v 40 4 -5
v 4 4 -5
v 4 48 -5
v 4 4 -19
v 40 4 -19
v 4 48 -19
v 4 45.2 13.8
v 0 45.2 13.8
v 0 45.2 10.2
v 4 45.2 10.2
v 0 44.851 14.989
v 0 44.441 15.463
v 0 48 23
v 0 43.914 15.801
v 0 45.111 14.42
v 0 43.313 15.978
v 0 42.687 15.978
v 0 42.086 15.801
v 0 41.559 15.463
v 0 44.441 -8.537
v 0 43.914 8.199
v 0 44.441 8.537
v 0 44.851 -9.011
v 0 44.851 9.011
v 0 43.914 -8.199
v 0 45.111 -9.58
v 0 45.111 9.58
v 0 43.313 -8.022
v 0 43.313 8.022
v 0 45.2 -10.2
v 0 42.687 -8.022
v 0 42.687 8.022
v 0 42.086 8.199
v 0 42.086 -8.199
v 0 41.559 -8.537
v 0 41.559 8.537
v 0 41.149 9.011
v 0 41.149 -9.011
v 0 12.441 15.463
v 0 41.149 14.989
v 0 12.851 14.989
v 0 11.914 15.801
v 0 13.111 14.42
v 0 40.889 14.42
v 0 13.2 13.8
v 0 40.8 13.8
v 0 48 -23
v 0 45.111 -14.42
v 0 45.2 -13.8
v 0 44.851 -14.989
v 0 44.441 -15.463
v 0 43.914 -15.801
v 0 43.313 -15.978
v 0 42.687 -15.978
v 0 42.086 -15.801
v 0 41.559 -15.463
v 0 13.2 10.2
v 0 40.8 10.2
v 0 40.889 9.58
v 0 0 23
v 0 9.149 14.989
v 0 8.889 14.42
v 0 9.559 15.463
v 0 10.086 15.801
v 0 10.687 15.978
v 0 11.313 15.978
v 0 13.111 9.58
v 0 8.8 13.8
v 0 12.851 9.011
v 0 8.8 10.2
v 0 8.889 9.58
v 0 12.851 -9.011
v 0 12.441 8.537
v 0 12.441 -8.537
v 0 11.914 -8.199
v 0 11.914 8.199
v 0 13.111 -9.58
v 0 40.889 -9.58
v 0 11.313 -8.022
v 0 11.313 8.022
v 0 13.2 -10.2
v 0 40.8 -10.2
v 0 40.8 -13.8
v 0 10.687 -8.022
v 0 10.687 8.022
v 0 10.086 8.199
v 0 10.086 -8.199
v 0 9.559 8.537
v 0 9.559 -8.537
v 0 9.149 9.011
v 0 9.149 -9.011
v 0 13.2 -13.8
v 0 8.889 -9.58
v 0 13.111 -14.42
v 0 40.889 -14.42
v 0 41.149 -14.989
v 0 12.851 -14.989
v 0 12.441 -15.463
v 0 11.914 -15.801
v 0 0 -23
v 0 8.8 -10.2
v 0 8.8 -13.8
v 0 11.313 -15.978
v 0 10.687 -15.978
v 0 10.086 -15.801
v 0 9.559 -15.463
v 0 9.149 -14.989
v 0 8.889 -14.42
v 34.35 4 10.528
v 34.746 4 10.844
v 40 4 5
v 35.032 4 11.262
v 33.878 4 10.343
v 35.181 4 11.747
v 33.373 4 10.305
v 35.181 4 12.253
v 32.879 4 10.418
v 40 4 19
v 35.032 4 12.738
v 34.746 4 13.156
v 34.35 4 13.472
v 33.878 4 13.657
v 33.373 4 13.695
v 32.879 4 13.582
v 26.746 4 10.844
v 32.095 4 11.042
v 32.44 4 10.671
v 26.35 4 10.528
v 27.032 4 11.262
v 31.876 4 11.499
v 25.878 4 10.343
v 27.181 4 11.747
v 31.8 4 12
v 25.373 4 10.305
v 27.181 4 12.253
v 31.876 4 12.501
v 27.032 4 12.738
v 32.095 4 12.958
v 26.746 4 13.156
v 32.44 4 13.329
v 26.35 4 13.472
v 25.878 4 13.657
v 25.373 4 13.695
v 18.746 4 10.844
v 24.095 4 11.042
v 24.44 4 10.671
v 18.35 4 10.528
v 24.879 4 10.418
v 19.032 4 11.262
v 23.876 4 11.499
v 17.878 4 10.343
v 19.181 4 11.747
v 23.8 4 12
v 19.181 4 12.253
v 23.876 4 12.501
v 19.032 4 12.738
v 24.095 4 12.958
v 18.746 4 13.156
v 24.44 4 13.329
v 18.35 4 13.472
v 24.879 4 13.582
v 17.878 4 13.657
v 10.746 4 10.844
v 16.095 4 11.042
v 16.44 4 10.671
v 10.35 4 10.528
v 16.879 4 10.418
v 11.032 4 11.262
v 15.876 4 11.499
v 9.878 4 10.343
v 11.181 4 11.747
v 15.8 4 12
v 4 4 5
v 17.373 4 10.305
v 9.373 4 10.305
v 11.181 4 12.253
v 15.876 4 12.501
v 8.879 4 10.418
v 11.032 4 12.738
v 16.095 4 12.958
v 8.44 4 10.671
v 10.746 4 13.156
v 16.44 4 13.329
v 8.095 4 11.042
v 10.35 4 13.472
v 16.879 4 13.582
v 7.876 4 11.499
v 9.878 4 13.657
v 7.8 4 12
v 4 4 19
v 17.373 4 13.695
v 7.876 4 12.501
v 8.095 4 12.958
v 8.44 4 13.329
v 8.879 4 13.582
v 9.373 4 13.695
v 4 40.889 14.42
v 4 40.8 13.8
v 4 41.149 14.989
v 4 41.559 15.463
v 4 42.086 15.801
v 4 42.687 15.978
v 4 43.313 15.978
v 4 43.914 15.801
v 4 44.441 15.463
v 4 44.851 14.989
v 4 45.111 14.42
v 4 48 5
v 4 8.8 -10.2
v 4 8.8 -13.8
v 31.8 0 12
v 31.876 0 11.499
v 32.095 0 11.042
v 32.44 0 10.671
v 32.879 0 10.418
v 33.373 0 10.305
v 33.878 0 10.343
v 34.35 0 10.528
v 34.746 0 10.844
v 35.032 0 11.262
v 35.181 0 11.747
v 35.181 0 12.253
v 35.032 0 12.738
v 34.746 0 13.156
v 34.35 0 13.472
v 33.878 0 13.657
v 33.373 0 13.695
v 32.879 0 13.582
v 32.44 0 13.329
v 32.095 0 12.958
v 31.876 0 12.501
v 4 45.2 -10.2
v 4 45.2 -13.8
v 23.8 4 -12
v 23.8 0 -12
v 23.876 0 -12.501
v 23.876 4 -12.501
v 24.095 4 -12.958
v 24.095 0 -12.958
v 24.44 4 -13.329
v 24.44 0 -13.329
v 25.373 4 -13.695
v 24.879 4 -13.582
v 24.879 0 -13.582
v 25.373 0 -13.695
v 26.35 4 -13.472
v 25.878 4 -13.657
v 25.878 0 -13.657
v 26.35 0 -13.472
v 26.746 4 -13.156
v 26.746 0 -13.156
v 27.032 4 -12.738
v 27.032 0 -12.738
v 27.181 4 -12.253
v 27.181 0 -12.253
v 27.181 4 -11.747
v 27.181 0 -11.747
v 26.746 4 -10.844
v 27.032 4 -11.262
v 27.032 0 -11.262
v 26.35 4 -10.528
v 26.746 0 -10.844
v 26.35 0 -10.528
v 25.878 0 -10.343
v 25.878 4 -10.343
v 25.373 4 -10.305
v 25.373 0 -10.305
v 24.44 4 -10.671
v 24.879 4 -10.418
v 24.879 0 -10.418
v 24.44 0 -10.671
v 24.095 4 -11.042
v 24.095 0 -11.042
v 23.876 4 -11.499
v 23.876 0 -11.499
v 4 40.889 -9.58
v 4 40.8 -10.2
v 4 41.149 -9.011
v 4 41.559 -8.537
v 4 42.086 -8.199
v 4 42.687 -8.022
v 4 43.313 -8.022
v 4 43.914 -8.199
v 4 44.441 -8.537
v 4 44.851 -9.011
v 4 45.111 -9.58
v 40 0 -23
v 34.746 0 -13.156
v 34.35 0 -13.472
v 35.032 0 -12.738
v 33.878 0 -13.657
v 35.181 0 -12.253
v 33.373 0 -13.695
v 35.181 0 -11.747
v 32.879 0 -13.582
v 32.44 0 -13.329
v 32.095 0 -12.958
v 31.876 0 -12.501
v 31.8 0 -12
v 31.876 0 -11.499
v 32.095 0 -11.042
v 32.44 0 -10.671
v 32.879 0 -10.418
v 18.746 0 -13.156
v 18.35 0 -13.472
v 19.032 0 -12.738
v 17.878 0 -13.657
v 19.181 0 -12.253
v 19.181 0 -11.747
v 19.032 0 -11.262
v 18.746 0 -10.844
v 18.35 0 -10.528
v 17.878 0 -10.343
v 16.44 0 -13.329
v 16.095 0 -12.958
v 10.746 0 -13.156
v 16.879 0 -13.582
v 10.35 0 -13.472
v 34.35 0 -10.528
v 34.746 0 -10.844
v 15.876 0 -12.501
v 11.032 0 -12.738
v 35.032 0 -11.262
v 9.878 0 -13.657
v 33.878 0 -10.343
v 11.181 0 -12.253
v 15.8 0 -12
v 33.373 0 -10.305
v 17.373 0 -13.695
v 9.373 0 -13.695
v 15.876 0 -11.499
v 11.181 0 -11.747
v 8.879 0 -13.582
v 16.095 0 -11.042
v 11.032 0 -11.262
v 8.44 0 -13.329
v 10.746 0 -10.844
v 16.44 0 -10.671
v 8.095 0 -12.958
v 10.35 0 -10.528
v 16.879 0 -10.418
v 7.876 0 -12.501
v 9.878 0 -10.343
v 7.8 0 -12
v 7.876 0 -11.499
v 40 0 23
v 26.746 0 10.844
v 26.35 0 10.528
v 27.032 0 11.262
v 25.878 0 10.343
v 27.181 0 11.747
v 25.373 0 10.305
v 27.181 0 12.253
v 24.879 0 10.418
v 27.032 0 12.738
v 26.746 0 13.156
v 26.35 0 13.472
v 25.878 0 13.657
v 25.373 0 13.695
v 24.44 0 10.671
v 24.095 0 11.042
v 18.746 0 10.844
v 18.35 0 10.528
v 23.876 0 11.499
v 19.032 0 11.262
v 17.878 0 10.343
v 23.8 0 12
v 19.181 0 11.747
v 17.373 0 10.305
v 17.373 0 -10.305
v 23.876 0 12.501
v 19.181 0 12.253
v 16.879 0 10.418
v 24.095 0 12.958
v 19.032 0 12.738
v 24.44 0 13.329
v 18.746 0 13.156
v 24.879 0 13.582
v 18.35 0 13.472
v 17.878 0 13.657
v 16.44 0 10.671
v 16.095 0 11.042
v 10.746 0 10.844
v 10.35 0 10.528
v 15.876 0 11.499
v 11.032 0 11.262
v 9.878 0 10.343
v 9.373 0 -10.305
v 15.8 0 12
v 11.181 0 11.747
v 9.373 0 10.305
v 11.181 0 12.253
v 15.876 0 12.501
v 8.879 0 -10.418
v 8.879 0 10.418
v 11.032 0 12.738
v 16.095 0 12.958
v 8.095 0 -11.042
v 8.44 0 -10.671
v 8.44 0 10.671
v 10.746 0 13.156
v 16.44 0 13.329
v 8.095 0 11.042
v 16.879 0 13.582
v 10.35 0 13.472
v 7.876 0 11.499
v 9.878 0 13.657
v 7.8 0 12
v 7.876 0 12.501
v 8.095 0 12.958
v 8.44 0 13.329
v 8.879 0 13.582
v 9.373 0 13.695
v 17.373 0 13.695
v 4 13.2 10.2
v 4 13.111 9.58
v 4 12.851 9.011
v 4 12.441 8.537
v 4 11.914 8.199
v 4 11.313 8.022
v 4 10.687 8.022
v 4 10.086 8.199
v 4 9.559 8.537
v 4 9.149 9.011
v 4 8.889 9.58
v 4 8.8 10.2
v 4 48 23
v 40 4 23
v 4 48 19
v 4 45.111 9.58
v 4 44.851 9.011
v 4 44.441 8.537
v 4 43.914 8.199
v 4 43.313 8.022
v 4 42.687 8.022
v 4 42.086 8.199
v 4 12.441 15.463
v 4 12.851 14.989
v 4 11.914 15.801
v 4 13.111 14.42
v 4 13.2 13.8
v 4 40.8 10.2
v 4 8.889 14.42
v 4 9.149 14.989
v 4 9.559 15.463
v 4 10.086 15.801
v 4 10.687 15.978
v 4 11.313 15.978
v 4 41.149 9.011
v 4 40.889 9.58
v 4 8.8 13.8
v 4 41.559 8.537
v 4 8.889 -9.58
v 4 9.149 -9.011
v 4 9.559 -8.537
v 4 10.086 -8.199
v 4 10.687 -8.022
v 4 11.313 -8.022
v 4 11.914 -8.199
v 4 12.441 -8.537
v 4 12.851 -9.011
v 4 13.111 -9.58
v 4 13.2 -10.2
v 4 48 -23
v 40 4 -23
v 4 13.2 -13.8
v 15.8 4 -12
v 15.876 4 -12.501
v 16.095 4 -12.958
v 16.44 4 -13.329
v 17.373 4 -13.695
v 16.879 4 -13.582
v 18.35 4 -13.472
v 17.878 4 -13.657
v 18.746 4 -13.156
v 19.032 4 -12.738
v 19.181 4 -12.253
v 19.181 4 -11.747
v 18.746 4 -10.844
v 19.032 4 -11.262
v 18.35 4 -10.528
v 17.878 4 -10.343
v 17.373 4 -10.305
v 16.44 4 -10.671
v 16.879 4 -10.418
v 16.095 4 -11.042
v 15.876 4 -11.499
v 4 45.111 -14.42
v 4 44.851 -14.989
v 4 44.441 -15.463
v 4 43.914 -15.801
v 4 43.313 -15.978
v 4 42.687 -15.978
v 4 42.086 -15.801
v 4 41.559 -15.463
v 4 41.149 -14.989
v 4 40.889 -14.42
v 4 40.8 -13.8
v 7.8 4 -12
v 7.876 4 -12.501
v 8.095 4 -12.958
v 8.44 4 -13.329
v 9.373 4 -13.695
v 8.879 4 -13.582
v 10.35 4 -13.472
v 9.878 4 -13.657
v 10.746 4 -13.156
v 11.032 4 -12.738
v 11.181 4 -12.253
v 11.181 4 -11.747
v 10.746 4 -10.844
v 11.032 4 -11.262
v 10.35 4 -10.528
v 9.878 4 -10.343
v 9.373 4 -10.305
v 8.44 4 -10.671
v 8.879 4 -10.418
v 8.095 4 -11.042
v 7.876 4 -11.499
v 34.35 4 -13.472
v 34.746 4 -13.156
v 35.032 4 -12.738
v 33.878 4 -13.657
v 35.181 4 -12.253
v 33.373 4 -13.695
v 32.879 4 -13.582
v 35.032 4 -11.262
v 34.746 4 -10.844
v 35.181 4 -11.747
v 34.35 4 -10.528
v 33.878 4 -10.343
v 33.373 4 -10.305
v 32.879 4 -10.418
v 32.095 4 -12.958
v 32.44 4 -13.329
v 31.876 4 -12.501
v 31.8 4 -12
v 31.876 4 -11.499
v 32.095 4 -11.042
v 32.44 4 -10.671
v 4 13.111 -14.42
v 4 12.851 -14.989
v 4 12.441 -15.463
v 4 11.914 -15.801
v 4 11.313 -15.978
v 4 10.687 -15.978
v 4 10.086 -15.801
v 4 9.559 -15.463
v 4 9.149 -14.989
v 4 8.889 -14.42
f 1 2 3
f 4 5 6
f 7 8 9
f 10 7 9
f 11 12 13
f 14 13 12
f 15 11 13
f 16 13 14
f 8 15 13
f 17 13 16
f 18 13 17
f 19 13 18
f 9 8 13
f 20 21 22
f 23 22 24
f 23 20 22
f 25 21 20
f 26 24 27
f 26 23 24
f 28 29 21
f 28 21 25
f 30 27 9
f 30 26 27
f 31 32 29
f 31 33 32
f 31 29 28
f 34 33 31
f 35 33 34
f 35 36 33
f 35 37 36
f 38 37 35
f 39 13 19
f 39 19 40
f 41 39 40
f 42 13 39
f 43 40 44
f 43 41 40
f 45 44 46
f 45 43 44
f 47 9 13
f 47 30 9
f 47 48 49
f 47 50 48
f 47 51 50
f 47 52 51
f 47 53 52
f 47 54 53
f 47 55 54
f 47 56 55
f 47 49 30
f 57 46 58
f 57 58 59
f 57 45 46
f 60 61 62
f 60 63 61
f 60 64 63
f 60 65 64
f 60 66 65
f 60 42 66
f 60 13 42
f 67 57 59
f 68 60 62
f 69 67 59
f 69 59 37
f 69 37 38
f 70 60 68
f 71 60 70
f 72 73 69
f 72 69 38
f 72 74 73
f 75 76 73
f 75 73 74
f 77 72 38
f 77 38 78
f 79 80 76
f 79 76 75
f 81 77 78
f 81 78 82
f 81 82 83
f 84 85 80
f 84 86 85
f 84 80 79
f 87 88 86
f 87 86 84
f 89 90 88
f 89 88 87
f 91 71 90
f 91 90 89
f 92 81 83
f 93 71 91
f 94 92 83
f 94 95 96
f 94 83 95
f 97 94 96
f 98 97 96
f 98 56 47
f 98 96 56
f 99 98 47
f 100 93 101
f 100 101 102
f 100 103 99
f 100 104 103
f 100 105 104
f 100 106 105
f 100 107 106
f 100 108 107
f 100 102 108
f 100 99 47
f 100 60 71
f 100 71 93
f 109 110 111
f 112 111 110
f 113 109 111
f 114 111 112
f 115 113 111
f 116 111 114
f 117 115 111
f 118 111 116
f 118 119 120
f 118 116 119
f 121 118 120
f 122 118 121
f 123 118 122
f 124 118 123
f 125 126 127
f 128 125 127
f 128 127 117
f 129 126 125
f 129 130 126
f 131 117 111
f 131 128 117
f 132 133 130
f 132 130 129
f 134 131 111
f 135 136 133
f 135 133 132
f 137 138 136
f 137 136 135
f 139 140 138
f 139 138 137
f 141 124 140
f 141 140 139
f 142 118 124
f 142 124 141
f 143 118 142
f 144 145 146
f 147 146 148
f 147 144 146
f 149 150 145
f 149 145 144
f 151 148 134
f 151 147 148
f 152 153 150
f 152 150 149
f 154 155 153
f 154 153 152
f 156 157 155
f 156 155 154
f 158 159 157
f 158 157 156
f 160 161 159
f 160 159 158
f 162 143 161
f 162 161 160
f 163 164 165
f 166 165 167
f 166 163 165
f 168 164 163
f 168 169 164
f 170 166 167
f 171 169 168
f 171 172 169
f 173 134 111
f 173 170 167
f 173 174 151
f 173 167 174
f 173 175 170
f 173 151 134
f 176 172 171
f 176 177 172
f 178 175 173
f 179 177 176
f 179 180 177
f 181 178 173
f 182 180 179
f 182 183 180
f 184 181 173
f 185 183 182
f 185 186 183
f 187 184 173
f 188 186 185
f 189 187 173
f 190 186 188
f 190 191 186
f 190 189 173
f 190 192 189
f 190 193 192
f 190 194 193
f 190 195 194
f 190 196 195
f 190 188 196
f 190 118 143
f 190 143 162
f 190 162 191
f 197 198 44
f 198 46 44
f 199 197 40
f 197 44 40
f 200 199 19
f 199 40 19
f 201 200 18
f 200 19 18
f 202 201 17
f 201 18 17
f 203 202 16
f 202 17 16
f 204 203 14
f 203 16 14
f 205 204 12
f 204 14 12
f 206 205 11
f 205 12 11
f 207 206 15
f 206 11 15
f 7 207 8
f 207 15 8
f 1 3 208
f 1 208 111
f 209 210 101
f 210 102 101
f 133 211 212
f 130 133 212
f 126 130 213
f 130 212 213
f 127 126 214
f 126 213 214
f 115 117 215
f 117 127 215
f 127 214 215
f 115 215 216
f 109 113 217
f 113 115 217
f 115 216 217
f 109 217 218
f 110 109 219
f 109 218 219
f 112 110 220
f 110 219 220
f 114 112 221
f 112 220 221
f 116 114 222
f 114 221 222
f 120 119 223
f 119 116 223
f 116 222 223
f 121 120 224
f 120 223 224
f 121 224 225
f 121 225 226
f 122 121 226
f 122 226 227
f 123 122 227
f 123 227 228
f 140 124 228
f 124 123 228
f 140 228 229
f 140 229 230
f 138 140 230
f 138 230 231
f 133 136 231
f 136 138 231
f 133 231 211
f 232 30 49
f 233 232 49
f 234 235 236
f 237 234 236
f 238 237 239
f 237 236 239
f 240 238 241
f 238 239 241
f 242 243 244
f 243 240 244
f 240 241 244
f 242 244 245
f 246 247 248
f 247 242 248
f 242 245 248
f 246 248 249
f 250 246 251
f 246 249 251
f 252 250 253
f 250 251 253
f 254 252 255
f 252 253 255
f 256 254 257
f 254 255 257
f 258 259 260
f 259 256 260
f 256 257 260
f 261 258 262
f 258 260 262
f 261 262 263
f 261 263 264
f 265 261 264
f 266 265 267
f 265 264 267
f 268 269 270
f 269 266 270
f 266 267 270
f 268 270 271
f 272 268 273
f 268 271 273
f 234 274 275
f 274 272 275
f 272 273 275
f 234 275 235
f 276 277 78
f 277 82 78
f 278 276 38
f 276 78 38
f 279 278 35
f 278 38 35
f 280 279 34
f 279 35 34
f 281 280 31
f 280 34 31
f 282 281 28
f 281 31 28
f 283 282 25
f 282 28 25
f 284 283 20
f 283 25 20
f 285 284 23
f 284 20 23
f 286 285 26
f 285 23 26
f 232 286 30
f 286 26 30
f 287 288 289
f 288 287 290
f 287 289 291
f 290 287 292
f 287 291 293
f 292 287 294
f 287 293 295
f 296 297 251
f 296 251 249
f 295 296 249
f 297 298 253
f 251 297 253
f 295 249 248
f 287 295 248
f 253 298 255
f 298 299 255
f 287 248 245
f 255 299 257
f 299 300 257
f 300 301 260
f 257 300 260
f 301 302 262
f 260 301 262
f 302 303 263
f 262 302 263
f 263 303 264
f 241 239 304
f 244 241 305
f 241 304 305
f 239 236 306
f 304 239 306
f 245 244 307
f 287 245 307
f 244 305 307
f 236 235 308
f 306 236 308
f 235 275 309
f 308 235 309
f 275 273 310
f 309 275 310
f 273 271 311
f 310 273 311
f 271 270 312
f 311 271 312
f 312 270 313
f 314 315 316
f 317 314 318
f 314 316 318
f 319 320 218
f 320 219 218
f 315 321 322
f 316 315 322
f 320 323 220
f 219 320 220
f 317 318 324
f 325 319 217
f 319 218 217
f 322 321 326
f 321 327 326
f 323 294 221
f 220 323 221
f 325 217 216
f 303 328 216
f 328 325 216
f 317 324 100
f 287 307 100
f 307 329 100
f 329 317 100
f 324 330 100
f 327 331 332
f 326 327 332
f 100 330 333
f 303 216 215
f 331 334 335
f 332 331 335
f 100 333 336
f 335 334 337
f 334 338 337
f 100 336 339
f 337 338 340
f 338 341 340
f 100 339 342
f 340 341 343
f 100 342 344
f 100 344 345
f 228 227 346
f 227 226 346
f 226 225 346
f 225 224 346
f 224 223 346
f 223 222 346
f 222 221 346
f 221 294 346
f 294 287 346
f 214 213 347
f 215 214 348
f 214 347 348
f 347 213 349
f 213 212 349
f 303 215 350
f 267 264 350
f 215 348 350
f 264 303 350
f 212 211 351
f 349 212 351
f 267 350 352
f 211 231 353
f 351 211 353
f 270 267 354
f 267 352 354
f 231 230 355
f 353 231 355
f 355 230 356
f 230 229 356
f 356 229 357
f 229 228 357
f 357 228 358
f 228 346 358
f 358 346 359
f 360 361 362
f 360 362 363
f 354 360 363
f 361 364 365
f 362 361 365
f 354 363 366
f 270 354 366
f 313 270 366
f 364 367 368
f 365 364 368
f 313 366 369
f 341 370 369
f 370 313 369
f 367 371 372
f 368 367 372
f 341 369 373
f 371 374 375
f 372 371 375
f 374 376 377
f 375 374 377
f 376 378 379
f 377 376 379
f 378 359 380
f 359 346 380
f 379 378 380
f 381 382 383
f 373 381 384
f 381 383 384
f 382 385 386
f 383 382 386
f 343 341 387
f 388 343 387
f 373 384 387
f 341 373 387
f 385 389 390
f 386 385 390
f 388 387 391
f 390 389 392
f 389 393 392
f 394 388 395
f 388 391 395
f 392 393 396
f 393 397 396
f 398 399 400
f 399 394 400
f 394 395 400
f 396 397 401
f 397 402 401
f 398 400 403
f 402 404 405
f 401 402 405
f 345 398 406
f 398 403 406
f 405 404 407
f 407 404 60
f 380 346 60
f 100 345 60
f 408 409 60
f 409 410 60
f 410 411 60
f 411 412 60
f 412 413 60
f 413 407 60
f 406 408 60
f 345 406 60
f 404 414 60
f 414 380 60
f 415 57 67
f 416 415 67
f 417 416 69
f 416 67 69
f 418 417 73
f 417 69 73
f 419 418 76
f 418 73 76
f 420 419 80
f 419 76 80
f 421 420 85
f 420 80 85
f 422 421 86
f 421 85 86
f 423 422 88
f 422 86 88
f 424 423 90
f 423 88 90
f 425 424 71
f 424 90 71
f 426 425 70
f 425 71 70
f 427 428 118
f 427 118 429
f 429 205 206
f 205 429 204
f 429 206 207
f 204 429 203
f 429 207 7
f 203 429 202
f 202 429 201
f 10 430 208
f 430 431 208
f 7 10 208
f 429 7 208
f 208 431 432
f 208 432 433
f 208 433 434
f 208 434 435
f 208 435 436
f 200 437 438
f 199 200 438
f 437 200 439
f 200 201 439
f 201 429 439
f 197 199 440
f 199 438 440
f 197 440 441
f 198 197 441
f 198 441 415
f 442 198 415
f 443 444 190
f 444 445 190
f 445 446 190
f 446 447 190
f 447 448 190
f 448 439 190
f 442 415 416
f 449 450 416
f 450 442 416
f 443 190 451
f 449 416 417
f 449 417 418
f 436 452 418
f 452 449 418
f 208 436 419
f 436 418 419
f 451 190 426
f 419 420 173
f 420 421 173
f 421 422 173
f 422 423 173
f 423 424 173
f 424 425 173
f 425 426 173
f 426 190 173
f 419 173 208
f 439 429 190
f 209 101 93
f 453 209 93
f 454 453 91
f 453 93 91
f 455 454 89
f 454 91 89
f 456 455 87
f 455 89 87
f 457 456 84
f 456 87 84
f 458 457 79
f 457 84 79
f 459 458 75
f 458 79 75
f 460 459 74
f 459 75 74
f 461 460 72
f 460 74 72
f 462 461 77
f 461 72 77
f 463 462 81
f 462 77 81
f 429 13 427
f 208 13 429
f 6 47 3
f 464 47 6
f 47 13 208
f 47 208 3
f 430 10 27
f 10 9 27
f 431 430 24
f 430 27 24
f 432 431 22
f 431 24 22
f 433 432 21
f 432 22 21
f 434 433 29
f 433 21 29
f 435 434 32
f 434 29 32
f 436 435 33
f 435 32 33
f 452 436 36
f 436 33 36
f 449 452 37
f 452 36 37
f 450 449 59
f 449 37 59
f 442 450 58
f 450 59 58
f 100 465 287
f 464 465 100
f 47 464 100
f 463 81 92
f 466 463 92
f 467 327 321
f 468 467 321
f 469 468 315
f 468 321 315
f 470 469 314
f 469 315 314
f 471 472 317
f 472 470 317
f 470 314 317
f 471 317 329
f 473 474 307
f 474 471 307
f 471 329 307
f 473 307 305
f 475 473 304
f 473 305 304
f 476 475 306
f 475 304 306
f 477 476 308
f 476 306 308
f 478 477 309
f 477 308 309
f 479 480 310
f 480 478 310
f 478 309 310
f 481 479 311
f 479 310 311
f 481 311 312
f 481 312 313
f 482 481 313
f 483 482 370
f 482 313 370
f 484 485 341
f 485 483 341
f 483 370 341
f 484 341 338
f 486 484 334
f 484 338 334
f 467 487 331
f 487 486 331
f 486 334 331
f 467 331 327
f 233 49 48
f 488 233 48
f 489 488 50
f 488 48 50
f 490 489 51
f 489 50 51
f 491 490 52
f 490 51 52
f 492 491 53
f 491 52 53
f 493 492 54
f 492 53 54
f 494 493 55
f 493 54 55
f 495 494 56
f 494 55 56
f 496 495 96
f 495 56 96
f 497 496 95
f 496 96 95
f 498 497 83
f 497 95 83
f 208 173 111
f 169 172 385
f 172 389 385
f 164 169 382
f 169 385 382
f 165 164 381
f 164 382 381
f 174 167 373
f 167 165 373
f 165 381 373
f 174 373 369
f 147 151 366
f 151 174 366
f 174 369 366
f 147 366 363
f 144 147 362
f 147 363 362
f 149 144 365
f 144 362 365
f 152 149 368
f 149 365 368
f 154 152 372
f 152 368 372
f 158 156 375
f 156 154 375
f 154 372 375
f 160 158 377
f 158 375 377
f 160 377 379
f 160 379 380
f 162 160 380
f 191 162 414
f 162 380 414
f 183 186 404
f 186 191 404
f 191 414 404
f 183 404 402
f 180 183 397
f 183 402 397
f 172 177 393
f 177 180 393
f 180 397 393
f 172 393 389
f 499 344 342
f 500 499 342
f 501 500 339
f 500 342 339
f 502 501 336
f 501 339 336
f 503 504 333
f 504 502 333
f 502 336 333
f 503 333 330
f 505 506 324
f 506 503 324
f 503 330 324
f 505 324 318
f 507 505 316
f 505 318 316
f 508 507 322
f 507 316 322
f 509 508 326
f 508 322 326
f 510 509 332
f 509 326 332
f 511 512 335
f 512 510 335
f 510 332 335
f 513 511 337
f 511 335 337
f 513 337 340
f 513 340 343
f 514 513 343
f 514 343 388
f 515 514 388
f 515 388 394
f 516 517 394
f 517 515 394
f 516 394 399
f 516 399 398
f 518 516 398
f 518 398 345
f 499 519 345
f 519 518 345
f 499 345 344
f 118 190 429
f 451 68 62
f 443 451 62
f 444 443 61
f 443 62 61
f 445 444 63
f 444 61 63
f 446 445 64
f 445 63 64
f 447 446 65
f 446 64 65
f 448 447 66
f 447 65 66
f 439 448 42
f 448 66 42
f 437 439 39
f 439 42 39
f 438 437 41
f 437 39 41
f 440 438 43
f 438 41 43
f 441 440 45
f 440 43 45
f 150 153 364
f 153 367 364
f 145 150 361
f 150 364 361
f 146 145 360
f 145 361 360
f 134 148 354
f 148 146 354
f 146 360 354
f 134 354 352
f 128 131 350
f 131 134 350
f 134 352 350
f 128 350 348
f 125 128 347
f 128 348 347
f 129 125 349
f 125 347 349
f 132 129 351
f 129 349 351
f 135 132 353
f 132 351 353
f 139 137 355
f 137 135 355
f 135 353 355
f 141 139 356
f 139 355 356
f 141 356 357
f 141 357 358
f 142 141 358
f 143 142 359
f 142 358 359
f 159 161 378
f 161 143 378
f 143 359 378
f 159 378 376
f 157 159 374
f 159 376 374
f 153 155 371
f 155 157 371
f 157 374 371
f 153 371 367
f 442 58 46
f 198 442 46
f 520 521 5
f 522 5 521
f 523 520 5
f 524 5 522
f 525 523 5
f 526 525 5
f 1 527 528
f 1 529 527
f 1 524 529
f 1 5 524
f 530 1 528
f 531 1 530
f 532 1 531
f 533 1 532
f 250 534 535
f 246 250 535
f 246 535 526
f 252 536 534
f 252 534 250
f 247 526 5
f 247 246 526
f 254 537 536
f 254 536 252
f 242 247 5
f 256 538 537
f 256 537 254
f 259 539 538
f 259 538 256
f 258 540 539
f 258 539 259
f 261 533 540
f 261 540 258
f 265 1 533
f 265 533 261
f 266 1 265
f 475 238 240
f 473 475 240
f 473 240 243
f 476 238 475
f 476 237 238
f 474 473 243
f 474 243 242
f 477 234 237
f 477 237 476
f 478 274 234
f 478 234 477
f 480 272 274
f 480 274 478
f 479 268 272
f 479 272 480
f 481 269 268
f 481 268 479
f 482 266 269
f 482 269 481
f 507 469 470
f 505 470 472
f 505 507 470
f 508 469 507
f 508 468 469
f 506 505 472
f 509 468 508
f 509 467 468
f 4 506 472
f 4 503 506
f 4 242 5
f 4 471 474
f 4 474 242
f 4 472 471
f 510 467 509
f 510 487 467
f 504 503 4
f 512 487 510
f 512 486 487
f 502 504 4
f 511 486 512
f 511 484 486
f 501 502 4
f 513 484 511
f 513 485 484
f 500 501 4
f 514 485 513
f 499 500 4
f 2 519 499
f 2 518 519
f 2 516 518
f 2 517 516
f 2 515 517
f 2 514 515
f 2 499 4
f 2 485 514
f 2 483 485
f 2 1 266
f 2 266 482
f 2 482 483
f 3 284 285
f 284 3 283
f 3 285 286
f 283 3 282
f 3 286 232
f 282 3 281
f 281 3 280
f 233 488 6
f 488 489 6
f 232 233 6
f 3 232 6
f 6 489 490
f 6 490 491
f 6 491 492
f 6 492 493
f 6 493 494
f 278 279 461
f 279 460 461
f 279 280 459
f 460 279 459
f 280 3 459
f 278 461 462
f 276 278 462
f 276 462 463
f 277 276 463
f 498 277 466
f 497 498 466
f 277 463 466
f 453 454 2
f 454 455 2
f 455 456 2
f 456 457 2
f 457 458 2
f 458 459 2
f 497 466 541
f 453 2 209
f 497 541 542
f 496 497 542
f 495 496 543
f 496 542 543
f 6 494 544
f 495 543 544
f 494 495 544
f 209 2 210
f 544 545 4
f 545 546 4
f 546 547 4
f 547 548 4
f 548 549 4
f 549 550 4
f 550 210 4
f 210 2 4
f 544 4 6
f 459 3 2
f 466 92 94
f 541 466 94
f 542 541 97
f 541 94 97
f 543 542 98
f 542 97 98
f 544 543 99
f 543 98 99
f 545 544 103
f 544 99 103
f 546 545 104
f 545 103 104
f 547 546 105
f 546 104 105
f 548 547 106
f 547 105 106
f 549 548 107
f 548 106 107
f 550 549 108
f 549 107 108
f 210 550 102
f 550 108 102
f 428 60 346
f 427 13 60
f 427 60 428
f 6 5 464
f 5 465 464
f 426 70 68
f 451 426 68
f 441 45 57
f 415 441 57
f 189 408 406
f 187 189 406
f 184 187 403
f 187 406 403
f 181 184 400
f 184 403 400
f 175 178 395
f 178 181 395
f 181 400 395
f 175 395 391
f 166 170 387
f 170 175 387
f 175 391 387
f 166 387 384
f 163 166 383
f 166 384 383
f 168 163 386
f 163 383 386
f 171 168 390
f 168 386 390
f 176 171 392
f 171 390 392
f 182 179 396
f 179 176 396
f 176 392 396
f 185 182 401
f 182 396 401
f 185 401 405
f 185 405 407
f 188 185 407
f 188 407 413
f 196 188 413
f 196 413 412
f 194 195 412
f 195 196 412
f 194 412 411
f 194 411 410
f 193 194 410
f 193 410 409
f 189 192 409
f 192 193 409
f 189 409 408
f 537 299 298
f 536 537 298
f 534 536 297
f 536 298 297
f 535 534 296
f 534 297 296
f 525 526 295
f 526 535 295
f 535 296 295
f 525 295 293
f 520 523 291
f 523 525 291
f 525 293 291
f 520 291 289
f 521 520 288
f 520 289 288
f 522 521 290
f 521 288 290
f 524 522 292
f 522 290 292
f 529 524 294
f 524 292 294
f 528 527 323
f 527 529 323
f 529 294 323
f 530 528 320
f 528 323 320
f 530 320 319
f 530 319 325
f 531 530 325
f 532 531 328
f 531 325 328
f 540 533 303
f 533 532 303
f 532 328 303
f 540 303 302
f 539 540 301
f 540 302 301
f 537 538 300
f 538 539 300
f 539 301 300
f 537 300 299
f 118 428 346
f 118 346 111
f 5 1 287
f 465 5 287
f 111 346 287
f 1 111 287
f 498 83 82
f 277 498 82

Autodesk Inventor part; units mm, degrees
ref_plane "YZ Plane" through (0, 0, 0) normal (1, 0, 0) x (0, 1, 0)
ref_plane "XZ Plane" through (0, 0, 0) normal (0, 1, 0) x (-1, 0, 0)
sketch "Sketch1" plane through (0, 0, 0) normal (0, 1, 0) x (-1, 0, 0)
  line L0 (-40, -23) -> (0, -23)
  line L1 (-40, 23) -> (0, 23)
  line L2 (0, 23) -> (0, -23)
  line L3 (-40, 23) -> (-40, -23)
  line L4 (-40, -12) -> (0, -12) construction
  line L5 (-40, 12) -> (0, 12) construction
  circle A0 centre (-9.5, 12) radius 1.7
  line L6 (-4, 23) -> (-4, -23) construction
  circle A1 centre (-17.5, 12) radius 1.7
  circle A2 centre (-25.5, 12) radius 1.7
  circle A3 centre (-33.5, 12) radius 1.7
  circle A4 centre (-9.5, -12) radius 1.7
  circle A5 centre (-17.5, -12) radius 1.7
  circle A6 centre (-25.5, -12) radius 1.7
  circle A7 centre (-33.5, -12) radius 1.7
  circle A8 centre (-9.5, 12) radius 3.5 construction
  line L7 (0, 19) -> (-40, 19) construction
  point P0 (0, 0)
  dimension "d5" = 46
  dimension "d6" = 23
  dimension "d7" = 40
  dimension "d8" = 0
  dimension "d9" = 12
  dimension "d10" = 12
  dimension "d11" = 3.4
  dimension "d12" = 4
  dimension "d13" = 9.5
  dimension "d16" = 8
  dimension "d19" = 24
  dimension "d22" = 7
  dimension "d23" = 4
extrude "Lift Attachment Plate" add sketch "Sketch1" along normal blind 4
sketch "Sketch2" plane through (0, 4, 0) normal (0, 1, 0) x (1, 0, 0)
  line L0 (0, 23) -> (0, -23) projected
  line L1 (40, 23) -> (0, 23) projected
  line L2 (0, -23) -> (4, -23)
  line L3 (4, -23) -> (4, 23)
  line L4 (4, 23) -> (0, 23)
  line L5 (0, 23) -> (0, -23)
  point P0 (0, 0)
  dimension "d26" = 4
extrude "Cross bar Attachment Plate" add sketch "Sketch2" along normal blind 44
sketch "Sketch3" plane through (0, 0, 23) normal (0, 0, 1) x (1, 0, 0)
  line L0 (4, 4) -> (4, 48) projected
  line L1 (4, 48) -> (4, 4)
  line L2 (40, 4) -> (4, 4) projected
  line L3 (4, 4) -> (40, 4)
  line L4 (40, 4) -> (4, 48)
  point P0 (0, 0)
extrude "Left bracket" add sketch "Sketch3" against normal blind 4
sketch "Sketch4" plane through (0, 0, 0) normal (0, 0, 1) x (1, 0, 0)
  line L0 (4, 48) -> (40, 4) projected
  line L1 (4, 4) -> (40, 4) projected
  line L2 (4, 48) -> (4, 4)
  line L3 (4, 4) -> (40, 4)
  line L4 (40, 4) -> (4, 48)
  point P0 (0, 0)
extrude "Center bracket" add sketch "Sketch4" along normal mid plane 10
sketch "Sketch5" plane through (40, 0, -23) normal (0, 0, -1) x (-1, 0, 0)
  line L0 (36, 48) -> (40, 48) projected
  line L1 (36, 48) -> (36, 4) projected
  line L2 (36, 48) -> (36, 4)
  line L3 (0, 4) -> (36, 4) projected
  line L4 (36, 4) -> (0, 4)
  line L5 (0, 4) -> (36, 48)
  point P0 (40, 0)
extrude "Right bracket" add sketch "Sketch5" against normal blind 4
sketch "Sketch6" plane through (0, 0, -23) normal (-1, 0, 0) x (0, 0, 1)
  circle A0 centre (35, 11) radius 2 construction
  circle A1 centre (11, 11) radius 2 construction
  line L0 (0, 0) -> (46, 0) construction
  line L1 (23, 57.6) -> (23, -9.6) construction
  circle A2 centre (35, 43) radius 2 construction
  circle A3 centre (11, 43) radius 2 construction
  line L2 (42, 48) -> (42, 4) construction
  line L3 (4, 4) -> (4, 48) construction
  line L4 (15, 11) -> (7, 11) construction
  line L5 (4, 4) -> (4, 48) projected
  line L6 (12.8, 13.2) -> (9.2, 13.2)
  line L7 (9.2, 8.8) -> (12.8, 8.8)
  arc A4 (12.8, 8.8) -> (12.8, 13.2) centre (12.8, 11) ccw
  arc A5 (9.2, 13.2) -> (9.2, 8.8) centre (9.2, 11) ccw
  point P0 (23, 0)
  dimension "d35" = 4
  dimension "d36" = 4
  dimension "d37" = 11
  dimension "d38" = 11
  dimension "d39" = 12
  dimension "d40" = 12
  dimension "d41" = 4
  dimension "d42" = 4
  dimension "d43" = 32
  dimension "d44" = 32
  dimension "d45" = 4
  dimension "d46" = 4
  dimension "d47" = 4.4
extrude "Extrusion6" cut sketch "Sketch6" against normal through all
pattern_linear "Rectangular Pattern1" count 2 spacing 24 along (0, 0, 1) count 2 spacing 32 along (0, 1, 0) of "Extrusion6"
equation "\"d6\" = 0.5 * d5"
equation "\"d10\" = d9"
equation "\"d38\" = d37"
equation "\"d39\" = d40"
equation "\"d44\" = d43"
equation "\"d46\" = d45"
properties part number "Cross bar bracket generic"
